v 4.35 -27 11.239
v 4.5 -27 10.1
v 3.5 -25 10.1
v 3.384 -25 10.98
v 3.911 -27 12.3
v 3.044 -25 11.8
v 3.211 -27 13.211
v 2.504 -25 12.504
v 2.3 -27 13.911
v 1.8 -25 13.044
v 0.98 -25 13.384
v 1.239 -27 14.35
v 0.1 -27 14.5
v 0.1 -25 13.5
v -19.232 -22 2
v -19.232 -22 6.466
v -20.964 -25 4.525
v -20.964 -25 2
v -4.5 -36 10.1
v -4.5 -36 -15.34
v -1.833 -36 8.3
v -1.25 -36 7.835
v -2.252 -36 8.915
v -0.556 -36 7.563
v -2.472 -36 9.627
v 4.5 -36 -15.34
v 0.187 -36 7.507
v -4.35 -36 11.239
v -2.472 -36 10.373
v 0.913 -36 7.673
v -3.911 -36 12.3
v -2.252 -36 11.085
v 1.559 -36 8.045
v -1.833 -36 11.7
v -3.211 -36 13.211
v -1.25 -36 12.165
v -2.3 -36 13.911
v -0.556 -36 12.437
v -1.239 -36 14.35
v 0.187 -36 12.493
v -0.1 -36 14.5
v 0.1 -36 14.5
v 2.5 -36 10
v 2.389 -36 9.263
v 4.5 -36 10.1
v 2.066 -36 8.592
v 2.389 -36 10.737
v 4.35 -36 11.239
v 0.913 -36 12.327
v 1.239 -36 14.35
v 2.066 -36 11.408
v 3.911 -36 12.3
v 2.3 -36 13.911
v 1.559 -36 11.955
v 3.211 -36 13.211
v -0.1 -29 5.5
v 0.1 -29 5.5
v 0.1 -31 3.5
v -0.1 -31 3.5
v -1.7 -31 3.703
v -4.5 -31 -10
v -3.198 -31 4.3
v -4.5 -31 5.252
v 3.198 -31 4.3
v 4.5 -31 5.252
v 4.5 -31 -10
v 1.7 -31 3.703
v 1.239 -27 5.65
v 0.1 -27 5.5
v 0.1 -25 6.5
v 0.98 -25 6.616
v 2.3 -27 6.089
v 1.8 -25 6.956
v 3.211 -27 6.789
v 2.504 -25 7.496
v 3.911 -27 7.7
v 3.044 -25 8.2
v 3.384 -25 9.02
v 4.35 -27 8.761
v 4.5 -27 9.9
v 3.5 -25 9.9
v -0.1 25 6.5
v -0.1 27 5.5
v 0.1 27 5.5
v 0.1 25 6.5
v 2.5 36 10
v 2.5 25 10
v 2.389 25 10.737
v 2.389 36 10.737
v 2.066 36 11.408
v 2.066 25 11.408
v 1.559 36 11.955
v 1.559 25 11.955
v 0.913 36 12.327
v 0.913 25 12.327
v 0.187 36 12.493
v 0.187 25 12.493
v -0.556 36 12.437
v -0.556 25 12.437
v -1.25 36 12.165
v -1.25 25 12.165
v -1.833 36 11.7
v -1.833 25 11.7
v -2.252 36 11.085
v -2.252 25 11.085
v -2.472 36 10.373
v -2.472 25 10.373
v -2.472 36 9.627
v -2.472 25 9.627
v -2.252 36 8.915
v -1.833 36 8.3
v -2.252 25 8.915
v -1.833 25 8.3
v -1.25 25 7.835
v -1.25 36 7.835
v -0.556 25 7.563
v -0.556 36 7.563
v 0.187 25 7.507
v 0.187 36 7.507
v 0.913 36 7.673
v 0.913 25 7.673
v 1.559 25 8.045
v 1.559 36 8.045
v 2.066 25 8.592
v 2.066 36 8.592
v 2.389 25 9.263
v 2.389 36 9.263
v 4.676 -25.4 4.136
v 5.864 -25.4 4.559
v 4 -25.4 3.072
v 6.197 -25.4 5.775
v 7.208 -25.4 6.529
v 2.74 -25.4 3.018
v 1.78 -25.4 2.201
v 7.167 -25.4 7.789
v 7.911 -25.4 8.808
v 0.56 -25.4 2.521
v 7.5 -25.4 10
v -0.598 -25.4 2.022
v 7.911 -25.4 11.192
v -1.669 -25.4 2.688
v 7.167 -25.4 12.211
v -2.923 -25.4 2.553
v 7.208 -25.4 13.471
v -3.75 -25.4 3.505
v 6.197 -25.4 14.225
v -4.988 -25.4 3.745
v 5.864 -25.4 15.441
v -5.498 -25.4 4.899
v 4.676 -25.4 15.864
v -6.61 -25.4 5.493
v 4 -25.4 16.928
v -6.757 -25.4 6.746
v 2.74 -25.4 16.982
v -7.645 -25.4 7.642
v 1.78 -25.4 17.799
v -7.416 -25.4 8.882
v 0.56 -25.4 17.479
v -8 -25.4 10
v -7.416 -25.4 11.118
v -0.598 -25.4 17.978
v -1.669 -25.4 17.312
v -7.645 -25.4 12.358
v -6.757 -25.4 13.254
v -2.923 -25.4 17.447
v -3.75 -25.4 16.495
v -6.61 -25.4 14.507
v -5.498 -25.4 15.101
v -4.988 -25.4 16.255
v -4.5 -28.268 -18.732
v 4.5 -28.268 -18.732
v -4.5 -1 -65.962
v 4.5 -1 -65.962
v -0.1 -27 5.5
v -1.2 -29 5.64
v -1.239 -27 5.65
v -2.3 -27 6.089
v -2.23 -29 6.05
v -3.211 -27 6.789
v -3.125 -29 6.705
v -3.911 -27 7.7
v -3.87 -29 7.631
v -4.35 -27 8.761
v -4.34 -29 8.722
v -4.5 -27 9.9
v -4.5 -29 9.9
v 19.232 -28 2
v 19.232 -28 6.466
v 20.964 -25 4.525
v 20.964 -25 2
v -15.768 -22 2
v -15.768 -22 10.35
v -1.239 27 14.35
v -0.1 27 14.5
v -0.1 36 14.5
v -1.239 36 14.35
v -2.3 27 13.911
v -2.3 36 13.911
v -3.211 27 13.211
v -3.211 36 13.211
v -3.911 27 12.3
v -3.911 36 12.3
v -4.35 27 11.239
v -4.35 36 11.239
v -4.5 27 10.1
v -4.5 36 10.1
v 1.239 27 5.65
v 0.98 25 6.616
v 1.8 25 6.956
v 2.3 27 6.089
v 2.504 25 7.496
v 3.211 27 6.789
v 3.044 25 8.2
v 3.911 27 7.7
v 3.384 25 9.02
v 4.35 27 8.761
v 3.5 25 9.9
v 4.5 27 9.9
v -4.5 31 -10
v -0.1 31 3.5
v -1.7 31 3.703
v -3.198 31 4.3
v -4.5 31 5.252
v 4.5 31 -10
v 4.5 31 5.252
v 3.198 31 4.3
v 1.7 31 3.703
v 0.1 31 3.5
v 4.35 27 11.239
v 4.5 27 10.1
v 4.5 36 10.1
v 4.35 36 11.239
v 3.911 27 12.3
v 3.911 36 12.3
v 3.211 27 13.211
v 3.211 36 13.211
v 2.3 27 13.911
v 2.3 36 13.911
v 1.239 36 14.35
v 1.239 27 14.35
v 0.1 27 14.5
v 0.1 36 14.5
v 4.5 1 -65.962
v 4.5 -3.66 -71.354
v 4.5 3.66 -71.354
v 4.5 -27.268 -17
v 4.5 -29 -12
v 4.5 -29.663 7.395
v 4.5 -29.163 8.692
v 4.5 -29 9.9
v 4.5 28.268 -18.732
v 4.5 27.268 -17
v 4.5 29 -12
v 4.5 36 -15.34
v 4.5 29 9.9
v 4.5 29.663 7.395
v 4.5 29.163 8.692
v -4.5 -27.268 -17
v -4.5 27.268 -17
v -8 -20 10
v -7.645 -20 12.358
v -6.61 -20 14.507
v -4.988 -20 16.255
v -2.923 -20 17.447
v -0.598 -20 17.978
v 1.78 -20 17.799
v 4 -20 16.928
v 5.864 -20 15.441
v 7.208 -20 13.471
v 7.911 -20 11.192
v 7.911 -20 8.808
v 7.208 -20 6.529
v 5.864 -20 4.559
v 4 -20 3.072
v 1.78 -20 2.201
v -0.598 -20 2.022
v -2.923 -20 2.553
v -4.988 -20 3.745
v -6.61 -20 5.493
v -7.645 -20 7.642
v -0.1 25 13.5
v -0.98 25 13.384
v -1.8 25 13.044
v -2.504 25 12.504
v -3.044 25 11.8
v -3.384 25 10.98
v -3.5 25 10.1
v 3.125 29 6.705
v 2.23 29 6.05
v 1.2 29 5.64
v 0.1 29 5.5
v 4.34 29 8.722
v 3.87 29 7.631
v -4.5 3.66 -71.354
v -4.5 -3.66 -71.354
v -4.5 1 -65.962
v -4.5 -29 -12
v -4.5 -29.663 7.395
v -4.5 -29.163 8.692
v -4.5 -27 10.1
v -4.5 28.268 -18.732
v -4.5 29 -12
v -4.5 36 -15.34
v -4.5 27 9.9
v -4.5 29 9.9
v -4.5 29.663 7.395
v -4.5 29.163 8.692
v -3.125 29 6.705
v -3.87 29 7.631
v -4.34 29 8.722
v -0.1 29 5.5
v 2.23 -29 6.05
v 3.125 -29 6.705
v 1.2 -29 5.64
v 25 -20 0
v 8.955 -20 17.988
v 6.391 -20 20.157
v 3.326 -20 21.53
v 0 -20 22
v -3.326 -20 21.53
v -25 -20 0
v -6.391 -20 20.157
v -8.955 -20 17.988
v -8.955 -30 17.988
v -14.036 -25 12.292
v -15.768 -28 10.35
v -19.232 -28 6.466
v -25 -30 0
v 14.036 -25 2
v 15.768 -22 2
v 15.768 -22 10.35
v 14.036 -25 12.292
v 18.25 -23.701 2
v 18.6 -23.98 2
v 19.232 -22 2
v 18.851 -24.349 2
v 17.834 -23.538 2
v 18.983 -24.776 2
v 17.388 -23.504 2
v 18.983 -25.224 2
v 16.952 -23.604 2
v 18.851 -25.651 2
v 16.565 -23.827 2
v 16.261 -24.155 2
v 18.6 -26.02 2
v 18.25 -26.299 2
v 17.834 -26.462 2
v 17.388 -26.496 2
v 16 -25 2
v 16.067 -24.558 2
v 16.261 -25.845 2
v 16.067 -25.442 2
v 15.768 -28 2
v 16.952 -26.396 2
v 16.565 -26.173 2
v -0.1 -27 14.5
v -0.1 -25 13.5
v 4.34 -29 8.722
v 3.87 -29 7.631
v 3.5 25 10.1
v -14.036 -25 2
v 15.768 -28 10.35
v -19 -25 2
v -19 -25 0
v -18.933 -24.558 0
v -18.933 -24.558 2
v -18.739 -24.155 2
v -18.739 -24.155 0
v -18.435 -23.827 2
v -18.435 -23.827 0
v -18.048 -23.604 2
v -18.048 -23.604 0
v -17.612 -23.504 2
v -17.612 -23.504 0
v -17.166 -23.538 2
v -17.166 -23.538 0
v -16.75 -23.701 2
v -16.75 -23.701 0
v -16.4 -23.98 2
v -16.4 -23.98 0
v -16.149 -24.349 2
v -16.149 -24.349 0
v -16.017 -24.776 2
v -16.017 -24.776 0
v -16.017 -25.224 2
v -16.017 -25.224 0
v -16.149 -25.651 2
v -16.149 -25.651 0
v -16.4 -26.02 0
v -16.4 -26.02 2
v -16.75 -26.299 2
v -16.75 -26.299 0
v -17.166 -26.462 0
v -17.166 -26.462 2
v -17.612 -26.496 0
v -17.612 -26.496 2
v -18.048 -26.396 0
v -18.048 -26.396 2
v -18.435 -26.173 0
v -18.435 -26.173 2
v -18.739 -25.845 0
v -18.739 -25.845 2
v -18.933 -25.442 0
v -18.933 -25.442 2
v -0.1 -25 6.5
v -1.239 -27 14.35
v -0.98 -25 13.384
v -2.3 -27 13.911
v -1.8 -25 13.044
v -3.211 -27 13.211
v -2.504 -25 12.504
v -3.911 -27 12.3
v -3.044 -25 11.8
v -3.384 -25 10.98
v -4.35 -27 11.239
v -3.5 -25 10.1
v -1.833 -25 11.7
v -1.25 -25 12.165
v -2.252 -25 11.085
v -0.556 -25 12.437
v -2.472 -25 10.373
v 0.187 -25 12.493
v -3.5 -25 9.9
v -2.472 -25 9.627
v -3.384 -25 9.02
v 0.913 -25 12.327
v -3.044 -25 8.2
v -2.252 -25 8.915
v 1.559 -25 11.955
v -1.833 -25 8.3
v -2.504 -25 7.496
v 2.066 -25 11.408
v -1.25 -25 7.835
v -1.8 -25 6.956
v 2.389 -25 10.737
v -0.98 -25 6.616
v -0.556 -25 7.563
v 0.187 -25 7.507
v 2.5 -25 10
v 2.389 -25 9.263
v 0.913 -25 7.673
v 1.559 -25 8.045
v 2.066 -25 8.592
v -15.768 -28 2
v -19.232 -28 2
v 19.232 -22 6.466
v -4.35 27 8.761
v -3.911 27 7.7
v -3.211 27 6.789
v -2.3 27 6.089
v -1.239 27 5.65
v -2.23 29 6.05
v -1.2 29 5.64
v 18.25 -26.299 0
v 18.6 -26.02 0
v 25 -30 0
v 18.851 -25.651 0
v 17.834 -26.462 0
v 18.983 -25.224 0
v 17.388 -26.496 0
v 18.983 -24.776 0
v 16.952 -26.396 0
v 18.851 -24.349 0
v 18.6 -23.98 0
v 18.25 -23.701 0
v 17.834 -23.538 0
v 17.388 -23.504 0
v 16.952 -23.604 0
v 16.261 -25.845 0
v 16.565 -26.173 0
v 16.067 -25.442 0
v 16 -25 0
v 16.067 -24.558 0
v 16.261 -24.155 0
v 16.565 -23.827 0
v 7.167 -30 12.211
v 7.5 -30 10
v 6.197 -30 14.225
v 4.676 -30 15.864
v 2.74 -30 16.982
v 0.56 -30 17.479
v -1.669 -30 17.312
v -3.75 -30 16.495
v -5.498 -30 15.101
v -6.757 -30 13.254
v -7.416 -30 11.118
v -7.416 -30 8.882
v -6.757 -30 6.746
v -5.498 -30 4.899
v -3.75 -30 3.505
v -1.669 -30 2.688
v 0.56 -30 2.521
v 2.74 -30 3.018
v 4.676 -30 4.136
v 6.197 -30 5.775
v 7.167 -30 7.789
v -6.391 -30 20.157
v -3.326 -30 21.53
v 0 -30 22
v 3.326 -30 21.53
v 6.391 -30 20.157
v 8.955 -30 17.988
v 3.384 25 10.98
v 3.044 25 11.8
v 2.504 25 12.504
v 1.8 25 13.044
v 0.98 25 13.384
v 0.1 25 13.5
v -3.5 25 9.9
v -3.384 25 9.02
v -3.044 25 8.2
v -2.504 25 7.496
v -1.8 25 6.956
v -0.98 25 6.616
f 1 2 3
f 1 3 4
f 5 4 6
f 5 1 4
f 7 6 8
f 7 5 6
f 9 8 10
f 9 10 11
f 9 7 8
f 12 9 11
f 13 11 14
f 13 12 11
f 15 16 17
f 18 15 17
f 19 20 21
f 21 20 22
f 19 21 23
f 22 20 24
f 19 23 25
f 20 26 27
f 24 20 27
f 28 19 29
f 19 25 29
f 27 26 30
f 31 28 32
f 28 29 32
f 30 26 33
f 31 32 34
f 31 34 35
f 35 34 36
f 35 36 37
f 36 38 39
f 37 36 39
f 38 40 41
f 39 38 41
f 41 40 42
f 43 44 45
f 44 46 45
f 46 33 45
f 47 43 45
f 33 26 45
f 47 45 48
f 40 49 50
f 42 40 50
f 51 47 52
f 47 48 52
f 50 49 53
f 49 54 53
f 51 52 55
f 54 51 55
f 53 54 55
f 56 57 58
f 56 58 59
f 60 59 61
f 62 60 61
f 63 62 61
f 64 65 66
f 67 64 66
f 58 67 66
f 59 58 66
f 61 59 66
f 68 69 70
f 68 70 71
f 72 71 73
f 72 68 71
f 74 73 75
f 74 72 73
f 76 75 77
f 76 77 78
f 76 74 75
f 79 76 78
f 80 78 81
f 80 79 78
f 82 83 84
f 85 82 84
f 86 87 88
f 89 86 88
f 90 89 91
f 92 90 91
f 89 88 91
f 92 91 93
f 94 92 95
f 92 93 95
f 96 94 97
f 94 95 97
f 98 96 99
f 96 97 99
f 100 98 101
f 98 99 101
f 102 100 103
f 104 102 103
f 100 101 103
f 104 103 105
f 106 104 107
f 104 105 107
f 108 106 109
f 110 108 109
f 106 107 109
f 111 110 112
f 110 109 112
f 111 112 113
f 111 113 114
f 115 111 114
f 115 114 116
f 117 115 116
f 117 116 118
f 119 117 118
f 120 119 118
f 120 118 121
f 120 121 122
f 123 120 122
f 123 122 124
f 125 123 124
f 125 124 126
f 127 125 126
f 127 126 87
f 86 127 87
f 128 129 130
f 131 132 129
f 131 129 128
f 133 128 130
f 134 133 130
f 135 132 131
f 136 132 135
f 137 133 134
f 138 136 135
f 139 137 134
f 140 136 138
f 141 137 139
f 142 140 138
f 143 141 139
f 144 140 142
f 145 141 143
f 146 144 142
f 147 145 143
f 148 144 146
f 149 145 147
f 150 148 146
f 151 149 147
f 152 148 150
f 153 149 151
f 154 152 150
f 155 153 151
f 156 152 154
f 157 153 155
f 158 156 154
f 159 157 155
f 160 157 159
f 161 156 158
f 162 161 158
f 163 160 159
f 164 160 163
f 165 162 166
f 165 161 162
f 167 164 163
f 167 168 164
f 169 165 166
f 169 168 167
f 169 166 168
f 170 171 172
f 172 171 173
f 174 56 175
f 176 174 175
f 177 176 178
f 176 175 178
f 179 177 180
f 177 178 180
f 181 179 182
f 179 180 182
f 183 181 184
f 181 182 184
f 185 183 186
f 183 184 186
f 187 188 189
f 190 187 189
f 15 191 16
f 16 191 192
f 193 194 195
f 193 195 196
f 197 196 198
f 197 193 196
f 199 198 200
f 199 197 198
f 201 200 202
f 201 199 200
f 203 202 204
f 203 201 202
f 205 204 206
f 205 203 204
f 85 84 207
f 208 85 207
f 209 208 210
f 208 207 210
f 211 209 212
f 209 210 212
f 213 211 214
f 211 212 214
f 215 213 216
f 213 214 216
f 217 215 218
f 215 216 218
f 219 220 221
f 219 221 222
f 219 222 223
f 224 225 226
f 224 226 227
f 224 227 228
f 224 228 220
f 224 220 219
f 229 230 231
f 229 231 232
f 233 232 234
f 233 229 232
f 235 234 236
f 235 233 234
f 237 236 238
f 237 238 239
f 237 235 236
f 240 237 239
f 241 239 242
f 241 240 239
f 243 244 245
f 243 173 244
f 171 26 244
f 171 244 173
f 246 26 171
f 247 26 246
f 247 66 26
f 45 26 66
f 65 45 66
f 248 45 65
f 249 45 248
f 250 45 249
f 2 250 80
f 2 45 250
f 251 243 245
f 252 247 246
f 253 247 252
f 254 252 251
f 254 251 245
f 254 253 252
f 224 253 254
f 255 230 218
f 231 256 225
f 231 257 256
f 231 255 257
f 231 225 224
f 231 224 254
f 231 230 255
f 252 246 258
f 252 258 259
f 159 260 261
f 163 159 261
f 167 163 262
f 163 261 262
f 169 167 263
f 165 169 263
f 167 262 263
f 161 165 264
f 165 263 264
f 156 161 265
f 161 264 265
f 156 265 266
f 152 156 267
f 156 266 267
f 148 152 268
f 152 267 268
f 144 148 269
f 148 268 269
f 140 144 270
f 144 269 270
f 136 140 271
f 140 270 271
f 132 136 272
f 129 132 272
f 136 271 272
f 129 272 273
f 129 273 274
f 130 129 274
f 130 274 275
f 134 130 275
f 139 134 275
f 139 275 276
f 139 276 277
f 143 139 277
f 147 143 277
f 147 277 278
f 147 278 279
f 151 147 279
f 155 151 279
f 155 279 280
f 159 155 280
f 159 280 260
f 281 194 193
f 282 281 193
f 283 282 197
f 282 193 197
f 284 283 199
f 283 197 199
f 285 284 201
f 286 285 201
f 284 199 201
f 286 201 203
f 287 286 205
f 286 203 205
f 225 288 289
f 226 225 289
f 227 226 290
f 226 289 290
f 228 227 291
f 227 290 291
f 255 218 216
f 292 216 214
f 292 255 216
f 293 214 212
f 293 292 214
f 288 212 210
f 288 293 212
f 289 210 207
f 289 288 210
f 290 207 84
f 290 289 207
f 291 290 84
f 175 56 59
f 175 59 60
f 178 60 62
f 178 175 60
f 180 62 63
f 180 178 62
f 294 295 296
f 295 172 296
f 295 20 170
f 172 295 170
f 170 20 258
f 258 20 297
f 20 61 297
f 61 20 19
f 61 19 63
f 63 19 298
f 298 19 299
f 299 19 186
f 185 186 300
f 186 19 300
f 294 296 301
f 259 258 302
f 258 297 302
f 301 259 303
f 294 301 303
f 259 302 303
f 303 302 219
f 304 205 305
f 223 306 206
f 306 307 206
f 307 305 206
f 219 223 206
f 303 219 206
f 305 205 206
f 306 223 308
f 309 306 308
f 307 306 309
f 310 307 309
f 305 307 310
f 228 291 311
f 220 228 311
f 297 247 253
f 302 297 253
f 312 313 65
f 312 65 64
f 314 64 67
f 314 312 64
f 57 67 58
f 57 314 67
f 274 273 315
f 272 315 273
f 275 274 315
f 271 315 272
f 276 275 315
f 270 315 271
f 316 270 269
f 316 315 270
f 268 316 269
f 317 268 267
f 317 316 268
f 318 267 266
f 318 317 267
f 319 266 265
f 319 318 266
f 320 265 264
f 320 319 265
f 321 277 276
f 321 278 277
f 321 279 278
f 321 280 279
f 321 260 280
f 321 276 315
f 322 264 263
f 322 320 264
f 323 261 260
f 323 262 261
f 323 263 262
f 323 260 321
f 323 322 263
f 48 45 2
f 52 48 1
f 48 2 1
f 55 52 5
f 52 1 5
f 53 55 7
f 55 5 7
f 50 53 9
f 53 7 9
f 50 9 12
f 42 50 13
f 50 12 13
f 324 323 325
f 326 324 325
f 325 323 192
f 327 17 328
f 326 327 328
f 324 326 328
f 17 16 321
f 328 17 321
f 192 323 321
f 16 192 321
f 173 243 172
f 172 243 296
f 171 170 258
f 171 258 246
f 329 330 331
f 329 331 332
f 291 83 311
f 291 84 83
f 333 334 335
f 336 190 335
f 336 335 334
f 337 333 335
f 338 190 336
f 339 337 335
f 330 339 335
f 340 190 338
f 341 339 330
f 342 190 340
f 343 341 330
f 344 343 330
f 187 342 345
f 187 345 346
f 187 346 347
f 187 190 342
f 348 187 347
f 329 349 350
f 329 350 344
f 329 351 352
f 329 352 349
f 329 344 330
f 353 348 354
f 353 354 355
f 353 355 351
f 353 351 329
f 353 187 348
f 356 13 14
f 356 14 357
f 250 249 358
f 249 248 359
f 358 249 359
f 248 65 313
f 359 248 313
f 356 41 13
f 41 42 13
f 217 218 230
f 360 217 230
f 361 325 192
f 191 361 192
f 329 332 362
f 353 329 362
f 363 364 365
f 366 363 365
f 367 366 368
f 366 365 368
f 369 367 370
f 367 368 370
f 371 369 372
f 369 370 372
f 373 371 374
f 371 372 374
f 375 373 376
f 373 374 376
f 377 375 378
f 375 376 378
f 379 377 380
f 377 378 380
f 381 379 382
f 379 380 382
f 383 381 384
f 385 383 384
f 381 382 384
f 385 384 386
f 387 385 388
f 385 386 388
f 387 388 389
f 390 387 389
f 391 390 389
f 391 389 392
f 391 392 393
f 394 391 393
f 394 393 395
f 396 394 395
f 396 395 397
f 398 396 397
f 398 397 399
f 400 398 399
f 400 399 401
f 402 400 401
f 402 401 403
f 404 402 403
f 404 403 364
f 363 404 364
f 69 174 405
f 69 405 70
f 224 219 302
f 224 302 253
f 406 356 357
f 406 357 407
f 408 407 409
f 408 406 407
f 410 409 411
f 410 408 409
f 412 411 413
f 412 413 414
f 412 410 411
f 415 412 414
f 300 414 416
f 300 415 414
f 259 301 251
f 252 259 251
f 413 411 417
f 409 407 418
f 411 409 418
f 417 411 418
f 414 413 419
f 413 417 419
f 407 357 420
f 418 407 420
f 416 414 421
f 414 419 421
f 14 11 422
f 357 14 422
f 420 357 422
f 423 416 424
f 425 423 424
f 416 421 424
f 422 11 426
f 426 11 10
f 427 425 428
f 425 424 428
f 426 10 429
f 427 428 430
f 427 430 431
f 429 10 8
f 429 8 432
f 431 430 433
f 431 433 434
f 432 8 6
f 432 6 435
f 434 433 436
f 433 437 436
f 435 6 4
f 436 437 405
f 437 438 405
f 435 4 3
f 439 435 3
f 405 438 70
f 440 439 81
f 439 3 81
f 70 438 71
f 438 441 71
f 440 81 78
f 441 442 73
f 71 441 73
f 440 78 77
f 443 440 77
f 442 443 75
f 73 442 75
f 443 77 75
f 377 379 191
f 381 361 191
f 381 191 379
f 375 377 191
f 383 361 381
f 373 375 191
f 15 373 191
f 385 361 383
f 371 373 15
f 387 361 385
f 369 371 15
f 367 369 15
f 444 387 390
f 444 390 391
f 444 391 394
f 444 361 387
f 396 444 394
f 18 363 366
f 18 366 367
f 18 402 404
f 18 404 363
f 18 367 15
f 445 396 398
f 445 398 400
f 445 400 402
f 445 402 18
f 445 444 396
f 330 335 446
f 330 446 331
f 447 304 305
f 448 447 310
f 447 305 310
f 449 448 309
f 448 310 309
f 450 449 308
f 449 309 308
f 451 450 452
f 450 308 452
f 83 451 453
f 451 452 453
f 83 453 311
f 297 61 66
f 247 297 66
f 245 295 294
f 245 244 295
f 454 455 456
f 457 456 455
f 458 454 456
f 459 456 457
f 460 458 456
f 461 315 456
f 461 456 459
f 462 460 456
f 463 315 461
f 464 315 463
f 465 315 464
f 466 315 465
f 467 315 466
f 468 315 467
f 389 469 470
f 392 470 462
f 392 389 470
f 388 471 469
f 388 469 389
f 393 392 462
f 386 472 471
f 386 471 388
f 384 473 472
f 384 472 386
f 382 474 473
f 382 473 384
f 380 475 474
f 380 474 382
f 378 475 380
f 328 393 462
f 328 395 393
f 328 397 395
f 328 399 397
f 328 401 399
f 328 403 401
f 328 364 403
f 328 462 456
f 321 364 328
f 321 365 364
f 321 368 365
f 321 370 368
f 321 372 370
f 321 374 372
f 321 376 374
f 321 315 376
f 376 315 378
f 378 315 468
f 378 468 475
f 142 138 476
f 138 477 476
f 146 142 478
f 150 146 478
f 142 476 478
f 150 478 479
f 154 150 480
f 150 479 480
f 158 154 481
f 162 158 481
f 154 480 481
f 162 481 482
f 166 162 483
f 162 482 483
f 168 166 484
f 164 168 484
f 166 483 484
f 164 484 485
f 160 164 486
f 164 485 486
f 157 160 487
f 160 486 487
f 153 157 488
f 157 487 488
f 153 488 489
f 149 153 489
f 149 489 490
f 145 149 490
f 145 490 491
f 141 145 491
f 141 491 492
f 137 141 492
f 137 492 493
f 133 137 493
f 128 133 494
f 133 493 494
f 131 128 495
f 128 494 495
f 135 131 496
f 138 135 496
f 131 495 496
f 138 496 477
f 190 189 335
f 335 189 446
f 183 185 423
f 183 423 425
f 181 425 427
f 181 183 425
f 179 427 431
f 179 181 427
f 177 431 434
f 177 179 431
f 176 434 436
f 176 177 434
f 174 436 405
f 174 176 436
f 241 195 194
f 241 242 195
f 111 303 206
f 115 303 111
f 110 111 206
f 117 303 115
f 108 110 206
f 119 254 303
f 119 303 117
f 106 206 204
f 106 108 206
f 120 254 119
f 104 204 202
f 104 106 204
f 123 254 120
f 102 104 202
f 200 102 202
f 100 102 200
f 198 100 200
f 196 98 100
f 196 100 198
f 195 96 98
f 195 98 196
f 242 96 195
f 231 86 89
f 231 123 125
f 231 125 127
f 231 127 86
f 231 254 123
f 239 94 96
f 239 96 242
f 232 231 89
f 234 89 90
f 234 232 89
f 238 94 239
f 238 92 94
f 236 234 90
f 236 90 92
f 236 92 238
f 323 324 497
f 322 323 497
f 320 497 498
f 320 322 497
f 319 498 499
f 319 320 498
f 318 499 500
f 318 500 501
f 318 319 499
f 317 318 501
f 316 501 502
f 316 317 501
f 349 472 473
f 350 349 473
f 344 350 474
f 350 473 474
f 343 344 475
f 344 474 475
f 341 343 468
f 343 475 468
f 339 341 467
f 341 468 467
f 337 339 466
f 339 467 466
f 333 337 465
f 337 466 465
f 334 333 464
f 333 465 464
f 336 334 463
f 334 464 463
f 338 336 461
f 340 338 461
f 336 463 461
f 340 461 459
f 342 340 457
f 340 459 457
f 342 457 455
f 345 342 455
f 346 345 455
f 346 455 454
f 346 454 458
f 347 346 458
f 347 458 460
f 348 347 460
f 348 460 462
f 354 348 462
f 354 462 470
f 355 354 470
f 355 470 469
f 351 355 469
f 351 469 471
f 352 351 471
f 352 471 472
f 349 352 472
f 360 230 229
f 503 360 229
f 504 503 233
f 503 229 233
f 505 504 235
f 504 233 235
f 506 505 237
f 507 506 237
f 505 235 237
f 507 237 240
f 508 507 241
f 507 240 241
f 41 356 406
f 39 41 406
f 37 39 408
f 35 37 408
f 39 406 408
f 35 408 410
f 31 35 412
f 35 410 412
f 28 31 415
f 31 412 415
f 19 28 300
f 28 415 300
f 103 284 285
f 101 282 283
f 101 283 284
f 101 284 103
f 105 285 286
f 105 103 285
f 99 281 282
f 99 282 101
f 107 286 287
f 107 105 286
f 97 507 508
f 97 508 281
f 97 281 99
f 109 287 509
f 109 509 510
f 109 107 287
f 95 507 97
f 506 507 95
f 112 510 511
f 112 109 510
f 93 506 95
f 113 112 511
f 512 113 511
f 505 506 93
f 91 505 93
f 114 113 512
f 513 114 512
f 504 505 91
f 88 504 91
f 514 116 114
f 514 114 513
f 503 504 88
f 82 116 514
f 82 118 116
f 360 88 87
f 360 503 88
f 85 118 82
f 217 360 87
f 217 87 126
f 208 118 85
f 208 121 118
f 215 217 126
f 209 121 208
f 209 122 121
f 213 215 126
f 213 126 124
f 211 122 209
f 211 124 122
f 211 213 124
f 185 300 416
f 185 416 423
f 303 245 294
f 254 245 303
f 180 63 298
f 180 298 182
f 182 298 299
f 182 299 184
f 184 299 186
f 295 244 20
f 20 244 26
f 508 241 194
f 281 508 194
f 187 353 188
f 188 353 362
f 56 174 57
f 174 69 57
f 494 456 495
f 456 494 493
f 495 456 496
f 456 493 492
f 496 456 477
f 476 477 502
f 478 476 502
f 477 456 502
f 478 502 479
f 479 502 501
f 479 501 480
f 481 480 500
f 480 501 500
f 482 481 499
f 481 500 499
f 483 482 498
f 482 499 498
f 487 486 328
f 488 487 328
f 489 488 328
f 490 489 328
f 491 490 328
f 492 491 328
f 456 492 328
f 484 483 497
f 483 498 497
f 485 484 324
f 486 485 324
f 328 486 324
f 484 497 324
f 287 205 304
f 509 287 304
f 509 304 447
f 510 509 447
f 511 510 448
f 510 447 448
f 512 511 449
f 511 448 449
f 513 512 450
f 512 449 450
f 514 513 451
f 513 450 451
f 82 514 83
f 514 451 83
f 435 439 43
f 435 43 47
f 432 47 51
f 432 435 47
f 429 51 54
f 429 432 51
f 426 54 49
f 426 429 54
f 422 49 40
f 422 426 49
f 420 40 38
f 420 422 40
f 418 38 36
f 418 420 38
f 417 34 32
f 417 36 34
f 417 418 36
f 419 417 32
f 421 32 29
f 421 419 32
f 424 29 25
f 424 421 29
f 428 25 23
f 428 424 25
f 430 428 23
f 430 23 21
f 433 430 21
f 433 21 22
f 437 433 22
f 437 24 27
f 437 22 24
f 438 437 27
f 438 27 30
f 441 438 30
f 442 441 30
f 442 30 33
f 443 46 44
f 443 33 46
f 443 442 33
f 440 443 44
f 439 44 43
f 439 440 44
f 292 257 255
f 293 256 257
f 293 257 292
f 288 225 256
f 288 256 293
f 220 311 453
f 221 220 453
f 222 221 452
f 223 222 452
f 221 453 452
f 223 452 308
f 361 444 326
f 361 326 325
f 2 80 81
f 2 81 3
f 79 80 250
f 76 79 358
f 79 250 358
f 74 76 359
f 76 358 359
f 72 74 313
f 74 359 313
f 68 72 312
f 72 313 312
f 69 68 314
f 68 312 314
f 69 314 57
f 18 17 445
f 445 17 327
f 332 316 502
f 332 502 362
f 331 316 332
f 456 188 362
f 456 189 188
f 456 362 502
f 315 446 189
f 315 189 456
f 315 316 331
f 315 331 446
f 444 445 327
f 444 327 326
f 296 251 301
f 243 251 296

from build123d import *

# Parameters (mm, degrees)
PAD_DEPTH               = 5
HOLE_D                  = 15
HOLE_CBORE_D            = 16
HOLE_CBORE_DEPTH        = 5.4
SKETCH002_R             = 1.5
HOLE001_DEPTH           = 25
POCKET_DEPTH            = 18
BODY001_PLACEMENT_ANGLE = 180
PAD001_DEPTH            = 4.5
FILLET_R                = 4.4
CHAMFER_1_SIZE2         = 2
CHAMFER_1_SIZE          = 1
CHAMFER_2_SIZE2         = 2
CHAMFER_2_SIZE          = 1
CHAMFER001_SIZE         = 2
SKETCH005_W             = 68
SKETCH005_H             = 5
PAD002_DEPTH            = 4.5
SKETCH006_R             = 2.5
POCKET001_DEPTH         = 36.001
POCKET001_DEPTH_BACK    = 36.001
CHAMFER002_SIZE         = 2
CHAMFER003_SIZE         = 2
CHAMFER004_SIZE         = 2


with BuildPart() as body001:
    # Sketch → Pad (new body, symmetric)
    with BuildSketch(Plane.XZ):
        with BuildLine():
            Line((-25, 0), (25, 0))
            Line((8.955135, 17.987838), (25, 0))
            ThreePointArc((8.955135, 17.987838), (0, 22), (-8.955135, 17.987838))
            Line((-8.955135, 17.987838), (-25, 0))
        make_face()
    extrude(amount=PAD_DEPTH, both=True)

    # Hole (through all)
    with Locations(Plane.XZ.offset(5)):
        with Locations((0, 10)):
            CounterBoreHole(HOLE_D / 2, HOLE_CBORE_D / 2, HOLE_CBORE_DEPTH)

    # Sketch002 (on Face6 of Hole) → Hole001 (cut)
    with BuildSketch(Plane(origin=(0, 0, 0), x_dir=(1, 0, 0), z_dir=(0, 0, -1))):
        with Locations((-17.5, 0)):
            Circle(SKETCH002_R)
        with Locations((17.5, 0)):
            Circle(SKETCH002_R)
    extrude(amount=-HOLE001_DEPTH, mode=Mode.SUBTRACT)

    # Sketch003 → Pocket (cut)
    with BuildSketch(Plane.XY.offset(20)):
        Polygon((-15.767949, 3), (-19.232051, 3), (-20.964102, 0), (-19.232051, -3), (-15.767949, -3), (-14.035898, 0), align=None)
        Polygon((15.767949, 3), (14.035898, 0), (15.767949, -3), (19.232051, -3), (20.964102, 0), (19.232051, 3), align=None)
    extrude(amount=-POCKET_DEPTH, mode=Mode.SUBTRACT)


with BuildPart() as body001_1:
    # Body placement: moved
    add(body001.part.moved(Location((0, 25, 0))))


with BuildPart() as body001_2:
    # Clone placement: moved
    add(body001_1.part.moved(Location((0, -25, 0))))


with BuildPart() as body001_3:
    # Body001 placement: moved
    add(body001_2.part.moved(Location((0, -25, 0))).rotate(Axis((0, -25, 0), (0, 0, 1)), BODY001_PLACEMENT_ANGLE))


with BuildPart() as body002:
    # Sketch004 → Pad001 (new body, symmetric)
    with BuildSketch(Plane.YZ):
        Polygon((-31, 5.5), (-31, -14), (0, -67.693575), (0, -71.353829), (-3.660254, -71.353829), (-36, -15.339746), (-36, 14.5), (-25, 14.5), (-25, 5.5), align=None)
    pad001 = extrude(amount=PAD001_DEPTH, both=True)

    # Mirrored: Pad001 across Sketch004 V_Axis
    add(pad001.mirror(Plane(origin=(0, 0, 0), x_dir=(1, 0, 0), z_dir=(0, 1, 0))))

    # Fillet
    fillet_edges = [body002.edges().sort_by_distance(p)[0] for p in [
        (-4.5, 28, 5.5),
        (-4.5, 30.5, 14.5),
        (4.5, 28, 5.5),
        (-4.5, -28, 5.5),
        (-4.5, -30.5, 14.5),
        (4.5, -30.5, 14.5),
        (4.5, 30.5, 14.5),
        (4.5, -28, 5.5),
    ]]
    fillet(fillet_edges, radius=FILLET_R)

    # Chamfer 1
    chamfer_1_edges = [body002.edges().sort_by_distance(p)[0] for p in [
        (-3.21127, 25, 13.21127),
    ]]
    chamfer_1_side = body002.faces().sort_by_distance((0, 25, 10))[0]
    chamfer(chamfer_1_edges, length=CHAMFER_1_SIZE, length2=CHAMFER_1_SIZE2, reference=chamfer_1_side)

    # Chamfer 2
    chamfer_2_edges = [body002.edges().sort_by_distance(p)[0] for p in [
        (-3.21127, -25, 13.21127),
    ]]
    chamfer_2_side = body002.faces().sort_by_distance((0, -25, 10))[0]
    chamfer(chamfer_2_edges, length=CHAMFER_2_SIZE, length2=CHAMFER_2_SIZE2, reference=chamfer_2_side)

    # Chamfer001
    chamfer001_edges = [body002.edges().sort_by_distance(p)[0] for p in [
        (0, 0, -67.693575),
    ]]
    chamfer(chamfer001_edges, length=CHAMFER001_SIZE)

    # Sketch005 → Pad002 (join, symmetric)
    with BuildSketch(Plane.YZ):
        with Locations((0, -14.5)):
            Rectangle(SKETCH005_W, SKETCH005_H)
    extrude(amount=PAD002_DEPTH, both=True)

    # Sketch006 → Pocket001 (cut, two sides)
    with BuildSketch(Plane.XZ) as pocket001_sk:
        with Locations((0, 10)):
            Circle(SKETCH006_R)
    extrude(amount=-POCKET001_DEPTH, mode=Mode.SUBTRACT)
    extrude(pocket001_sk.sketch, amount=POCKET001_DEPTH_BACK, mode=Mode.SUBTRACT)

    # Chamfer002
    chamfer002_edges = [body002.edges().sort_by_distance(p)[0] for p in [
        (0, -29.267949, -17),
        (0, 29.267949, -17),
        (0, 31, -12),
        (0, -31, -12),
    ]]
    chamfer(chamfer002_edges, length=CHAMFER002_SIZE)

    # Chamfer003
    chamfer003_edges = [body002.edges().sort_by_distance(p)[0] for p in [
        (-3.21127, -31, 6.78873),
    ]]
    chamfer(chamfer003_edges, length=CHAMFER003_SIZE)

    # Chamfer004
    chamfer004_edges = [body002.edges().sort_by_distance(p)[0] for p in [
        (3.21127, 31, 6.78873),
    ]]
    chamfer(chamfer004_edges, length=CHAMFER004_SIZE)


solid = Compound([body001_3.part, body002.part])
